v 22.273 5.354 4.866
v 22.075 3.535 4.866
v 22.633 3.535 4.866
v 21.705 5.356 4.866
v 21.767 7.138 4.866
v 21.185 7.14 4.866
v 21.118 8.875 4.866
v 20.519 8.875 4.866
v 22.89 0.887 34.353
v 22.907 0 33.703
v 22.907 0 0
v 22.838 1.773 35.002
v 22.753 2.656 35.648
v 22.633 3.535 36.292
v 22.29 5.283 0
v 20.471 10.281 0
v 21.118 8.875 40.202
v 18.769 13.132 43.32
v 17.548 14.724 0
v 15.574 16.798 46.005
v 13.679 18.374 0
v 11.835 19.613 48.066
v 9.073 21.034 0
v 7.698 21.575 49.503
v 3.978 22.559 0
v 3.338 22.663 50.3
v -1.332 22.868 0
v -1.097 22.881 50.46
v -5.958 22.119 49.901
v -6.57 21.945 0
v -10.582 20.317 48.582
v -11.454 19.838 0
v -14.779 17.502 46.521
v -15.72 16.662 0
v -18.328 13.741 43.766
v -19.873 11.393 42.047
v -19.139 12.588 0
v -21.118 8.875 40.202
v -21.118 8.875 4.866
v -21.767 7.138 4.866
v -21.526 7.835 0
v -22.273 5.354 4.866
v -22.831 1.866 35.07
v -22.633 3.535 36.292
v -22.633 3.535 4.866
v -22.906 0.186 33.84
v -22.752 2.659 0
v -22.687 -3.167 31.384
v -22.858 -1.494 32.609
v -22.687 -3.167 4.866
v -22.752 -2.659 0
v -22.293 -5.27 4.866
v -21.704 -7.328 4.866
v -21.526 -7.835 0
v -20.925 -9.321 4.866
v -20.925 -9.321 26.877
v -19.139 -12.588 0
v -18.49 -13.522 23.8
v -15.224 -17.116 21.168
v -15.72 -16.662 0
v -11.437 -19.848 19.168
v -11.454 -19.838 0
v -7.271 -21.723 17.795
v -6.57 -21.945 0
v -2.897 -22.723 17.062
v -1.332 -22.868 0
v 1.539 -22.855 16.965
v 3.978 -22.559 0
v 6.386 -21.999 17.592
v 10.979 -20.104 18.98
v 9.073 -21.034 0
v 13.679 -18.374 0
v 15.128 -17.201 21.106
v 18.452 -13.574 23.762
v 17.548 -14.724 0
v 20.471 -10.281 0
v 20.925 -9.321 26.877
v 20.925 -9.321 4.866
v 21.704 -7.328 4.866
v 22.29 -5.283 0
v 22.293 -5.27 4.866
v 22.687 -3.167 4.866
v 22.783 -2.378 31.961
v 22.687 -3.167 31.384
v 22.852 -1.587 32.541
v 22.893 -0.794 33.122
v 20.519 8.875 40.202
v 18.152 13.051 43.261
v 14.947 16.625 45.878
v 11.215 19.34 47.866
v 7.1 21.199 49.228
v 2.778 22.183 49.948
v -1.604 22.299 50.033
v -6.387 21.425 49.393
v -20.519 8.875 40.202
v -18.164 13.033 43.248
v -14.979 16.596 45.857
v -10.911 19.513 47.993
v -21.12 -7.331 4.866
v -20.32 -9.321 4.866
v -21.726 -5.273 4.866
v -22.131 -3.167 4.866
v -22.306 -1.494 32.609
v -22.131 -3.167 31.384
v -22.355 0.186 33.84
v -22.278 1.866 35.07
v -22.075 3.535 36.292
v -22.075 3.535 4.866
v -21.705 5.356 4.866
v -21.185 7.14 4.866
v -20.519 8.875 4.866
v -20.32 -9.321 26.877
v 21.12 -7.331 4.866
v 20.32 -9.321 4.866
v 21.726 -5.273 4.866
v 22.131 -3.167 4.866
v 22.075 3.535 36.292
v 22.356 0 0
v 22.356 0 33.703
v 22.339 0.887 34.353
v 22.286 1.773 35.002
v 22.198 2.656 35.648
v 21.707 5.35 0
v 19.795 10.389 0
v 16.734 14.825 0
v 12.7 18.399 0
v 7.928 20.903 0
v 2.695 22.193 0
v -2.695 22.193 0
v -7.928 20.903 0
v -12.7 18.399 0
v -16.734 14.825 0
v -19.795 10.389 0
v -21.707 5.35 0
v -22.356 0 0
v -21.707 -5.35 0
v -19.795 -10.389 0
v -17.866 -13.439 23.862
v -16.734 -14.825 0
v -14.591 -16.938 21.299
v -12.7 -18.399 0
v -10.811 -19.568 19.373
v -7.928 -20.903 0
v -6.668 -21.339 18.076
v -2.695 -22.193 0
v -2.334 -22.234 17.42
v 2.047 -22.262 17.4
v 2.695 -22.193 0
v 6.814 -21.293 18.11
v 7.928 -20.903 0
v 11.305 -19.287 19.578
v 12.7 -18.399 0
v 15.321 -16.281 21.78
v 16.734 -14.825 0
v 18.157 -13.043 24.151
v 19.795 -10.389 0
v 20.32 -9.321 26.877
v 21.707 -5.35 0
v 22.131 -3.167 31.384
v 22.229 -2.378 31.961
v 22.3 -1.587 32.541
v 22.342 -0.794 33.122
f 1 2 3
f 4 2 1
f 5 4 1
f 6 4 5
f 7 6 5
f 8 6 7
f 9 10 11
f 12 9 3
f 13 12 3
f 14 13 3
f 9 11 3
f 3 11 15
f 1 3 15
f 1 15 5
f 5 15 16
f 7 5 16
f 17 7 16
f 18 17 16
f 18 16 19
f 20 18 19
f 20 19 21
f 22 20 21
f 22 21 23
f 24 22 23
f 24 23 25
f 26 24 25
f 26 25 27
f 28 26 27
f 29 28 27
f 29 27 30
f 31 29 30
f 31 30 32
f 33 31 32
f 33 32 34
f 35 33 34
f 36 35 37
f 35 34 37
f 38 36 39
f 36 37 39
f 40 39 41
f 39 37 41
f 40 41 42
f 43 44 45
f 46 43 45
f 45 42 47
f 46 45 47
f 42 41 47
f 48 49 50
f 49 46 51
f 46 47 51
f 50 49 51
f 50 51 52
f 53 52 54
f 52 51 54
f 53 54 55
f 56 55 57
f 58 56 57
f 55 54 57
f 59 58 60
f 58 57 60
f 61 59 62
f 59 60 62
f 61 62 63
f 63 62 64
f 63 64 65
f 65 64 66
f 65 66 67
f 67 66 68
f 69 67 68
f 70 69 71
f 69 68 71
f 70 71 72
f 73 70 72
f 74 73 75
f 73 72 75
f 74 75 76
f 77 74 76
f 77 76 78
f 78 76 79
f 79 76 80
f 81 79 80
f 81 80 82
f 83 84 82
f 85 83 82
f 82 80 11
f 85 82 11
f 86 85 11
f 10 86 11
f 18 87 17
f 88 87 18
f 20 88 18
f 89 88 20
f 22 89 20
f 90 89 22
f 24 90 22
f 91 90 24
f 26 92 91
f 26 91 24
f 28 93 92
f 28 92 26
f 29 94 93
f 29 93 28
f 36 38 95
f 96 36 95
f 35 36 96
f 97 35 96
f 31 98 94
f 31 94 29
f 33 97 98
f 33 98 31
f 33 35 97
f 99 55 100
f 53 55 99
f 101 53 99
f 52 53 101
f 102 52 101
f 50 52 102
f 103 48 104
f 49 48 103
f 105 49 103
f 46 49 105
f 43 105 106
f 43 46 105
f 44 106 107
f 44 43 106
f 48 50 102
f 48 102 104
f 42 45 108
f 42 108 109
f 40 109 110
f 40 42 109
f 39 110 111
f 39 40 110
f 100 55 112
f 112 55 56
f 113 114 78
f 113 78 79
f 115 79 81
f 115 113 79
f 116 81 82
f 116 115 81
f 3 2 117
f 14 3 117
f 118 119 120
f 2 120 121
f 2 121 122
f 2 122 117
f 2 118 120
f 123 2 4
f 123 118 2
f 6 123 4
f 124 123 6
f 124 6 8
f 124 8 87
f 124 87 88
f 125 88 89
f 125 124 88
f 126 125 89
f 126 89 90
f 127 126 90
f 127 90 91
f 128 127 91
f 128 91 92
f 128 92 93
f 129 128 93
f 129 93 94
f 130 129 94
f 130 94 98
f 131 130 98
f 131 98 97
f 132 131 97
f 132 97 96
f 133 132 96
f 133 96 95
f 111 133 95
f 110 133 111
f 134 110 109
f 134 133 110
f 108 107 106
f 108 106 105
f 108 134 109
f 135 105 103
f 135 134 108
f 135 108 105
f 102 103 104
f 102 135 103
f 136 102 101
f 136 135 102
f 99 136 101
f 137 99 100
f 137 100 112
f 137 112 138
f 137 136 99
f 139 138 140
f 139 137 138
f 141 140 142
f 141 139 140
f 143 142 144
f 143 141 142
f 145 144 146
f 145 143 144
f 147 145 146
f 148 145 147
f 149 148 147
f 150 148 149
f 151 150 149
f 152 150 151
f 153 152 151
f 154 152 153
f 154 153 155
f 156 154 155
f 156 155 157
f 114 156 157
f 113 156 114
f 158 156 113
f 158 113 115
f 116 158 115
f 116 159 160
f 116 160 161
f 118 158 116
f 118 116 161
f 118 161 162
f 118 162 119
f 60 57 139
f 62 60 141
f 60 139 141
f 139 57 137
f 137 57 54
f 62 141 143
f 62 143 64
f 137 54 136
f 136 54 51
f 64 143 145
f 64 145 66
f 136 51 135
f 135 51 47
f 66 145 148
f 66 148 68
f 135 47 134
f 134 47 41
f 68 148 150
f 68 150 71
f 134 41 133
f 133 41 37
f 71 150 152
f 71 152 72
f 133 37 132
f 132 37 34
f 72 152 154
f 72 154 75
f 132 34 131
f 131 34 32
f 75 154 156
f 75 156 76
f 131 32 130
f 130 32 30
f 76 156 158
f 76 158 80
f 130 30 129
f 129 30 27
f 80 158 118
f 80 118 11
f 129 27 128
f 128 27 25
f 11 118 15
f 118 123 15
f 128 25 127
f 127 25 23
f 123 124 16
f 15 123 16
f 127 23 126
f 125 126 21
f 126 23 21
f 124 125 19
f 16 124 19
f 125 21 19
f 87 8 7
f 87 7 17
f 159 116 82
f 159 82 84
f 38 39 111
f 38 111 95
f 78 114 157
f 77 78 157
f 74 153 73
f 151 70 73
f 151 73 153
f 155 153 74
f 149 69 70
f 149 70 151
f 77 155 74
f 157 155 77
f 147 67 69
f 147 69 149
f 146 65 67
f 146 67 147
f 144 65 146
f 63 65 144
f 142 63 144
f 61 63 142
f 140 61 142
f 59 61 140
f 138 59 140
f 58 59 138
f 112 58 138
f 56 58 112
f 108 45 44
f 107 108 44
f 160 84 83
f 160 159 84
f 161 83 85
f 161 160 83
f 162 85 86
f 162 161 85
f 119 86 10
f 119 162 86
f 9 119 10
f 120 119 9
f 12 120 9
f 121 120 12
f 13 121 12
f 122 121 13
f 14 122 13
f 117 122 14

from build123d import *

# Parameters (mm, degrees)
F0_R      = 22.907165
F1_DEPTH  = 51.1
F4_DEPTH  = 106.8
F5_R      = 22.356235
F5_R_2    = 21
F6_DEPTH  = 54.8
F7_R      = 21.538885
F8_DEPTH  = 64.2
F9_W      = 6.154686
F9_H      = 33.235299
F9_W_2    = 5.339459
F9_H_2    = 37.849365
F10_DEPTH = 98.8
F11_DEPTH = 96.1


with BuildPart() as f1:
    # F0 (on Top) → F1 (new body)
    with BuildSketch(Plane.XY):
        Circle(F0_R)
    extrude(amount=F1_DEPTH)

    # F3 (on offset) → F4 (cut)
    with BuildSketch(Plane.YZ.offset(-32.2)):
        Polygon((-46.021562, 0), (31.365387, 56.67308), (-37.553031, 54.173857), align=None)
    extrude(amount=F4_DEPTH, mode=Mode.SUBTRACT)

    # F5 (on Top) → F6 (cut)
    with BuildSketch(Plane.XY):
        Circle(F5_R)
        Circle(F5_R_2, mode=Mode.SUBTRACT)
    extrude(amount=F6_DEPTH, mode=Mode.SUBTRACT)

    # F7 (on Top) → F8 (cut)
    with BuildSketch(Plane.XY):
        Circle(F7_R)
    extrude(amount=F8_DEPTH, mode=Mode.SUBTRACT)

    # F9 (on offset) → F10 (cut)
    with BuildSketch(Plane.YZ.offset(-32.2)):
        with Locations((-6.243853, 21.483376)):
            Rectangle(F9_W, F9_H)
        with Locations((6.204987, 23.790409)):
            Rectangle(F9_W_2, F9_H_2)
    extrude(amount=F10_DEPTH, mode=Mode.SUBTRACT)

    # F9 (on offset) → F11 (cut)
    with BuildSketch(Plane.YZ.offset(-32.2)):
        with Locations((-6.243853, 21.483376)):
            Rectangle(F9_W, F9_H)
        with Locations((6.204987, 23.790409)):
            Rectangle(F9_W_2, F9_H_2)
    extrude(amount=F11_DEPTH, mode=Mode.SUBTRACT)


solid = f1.part
